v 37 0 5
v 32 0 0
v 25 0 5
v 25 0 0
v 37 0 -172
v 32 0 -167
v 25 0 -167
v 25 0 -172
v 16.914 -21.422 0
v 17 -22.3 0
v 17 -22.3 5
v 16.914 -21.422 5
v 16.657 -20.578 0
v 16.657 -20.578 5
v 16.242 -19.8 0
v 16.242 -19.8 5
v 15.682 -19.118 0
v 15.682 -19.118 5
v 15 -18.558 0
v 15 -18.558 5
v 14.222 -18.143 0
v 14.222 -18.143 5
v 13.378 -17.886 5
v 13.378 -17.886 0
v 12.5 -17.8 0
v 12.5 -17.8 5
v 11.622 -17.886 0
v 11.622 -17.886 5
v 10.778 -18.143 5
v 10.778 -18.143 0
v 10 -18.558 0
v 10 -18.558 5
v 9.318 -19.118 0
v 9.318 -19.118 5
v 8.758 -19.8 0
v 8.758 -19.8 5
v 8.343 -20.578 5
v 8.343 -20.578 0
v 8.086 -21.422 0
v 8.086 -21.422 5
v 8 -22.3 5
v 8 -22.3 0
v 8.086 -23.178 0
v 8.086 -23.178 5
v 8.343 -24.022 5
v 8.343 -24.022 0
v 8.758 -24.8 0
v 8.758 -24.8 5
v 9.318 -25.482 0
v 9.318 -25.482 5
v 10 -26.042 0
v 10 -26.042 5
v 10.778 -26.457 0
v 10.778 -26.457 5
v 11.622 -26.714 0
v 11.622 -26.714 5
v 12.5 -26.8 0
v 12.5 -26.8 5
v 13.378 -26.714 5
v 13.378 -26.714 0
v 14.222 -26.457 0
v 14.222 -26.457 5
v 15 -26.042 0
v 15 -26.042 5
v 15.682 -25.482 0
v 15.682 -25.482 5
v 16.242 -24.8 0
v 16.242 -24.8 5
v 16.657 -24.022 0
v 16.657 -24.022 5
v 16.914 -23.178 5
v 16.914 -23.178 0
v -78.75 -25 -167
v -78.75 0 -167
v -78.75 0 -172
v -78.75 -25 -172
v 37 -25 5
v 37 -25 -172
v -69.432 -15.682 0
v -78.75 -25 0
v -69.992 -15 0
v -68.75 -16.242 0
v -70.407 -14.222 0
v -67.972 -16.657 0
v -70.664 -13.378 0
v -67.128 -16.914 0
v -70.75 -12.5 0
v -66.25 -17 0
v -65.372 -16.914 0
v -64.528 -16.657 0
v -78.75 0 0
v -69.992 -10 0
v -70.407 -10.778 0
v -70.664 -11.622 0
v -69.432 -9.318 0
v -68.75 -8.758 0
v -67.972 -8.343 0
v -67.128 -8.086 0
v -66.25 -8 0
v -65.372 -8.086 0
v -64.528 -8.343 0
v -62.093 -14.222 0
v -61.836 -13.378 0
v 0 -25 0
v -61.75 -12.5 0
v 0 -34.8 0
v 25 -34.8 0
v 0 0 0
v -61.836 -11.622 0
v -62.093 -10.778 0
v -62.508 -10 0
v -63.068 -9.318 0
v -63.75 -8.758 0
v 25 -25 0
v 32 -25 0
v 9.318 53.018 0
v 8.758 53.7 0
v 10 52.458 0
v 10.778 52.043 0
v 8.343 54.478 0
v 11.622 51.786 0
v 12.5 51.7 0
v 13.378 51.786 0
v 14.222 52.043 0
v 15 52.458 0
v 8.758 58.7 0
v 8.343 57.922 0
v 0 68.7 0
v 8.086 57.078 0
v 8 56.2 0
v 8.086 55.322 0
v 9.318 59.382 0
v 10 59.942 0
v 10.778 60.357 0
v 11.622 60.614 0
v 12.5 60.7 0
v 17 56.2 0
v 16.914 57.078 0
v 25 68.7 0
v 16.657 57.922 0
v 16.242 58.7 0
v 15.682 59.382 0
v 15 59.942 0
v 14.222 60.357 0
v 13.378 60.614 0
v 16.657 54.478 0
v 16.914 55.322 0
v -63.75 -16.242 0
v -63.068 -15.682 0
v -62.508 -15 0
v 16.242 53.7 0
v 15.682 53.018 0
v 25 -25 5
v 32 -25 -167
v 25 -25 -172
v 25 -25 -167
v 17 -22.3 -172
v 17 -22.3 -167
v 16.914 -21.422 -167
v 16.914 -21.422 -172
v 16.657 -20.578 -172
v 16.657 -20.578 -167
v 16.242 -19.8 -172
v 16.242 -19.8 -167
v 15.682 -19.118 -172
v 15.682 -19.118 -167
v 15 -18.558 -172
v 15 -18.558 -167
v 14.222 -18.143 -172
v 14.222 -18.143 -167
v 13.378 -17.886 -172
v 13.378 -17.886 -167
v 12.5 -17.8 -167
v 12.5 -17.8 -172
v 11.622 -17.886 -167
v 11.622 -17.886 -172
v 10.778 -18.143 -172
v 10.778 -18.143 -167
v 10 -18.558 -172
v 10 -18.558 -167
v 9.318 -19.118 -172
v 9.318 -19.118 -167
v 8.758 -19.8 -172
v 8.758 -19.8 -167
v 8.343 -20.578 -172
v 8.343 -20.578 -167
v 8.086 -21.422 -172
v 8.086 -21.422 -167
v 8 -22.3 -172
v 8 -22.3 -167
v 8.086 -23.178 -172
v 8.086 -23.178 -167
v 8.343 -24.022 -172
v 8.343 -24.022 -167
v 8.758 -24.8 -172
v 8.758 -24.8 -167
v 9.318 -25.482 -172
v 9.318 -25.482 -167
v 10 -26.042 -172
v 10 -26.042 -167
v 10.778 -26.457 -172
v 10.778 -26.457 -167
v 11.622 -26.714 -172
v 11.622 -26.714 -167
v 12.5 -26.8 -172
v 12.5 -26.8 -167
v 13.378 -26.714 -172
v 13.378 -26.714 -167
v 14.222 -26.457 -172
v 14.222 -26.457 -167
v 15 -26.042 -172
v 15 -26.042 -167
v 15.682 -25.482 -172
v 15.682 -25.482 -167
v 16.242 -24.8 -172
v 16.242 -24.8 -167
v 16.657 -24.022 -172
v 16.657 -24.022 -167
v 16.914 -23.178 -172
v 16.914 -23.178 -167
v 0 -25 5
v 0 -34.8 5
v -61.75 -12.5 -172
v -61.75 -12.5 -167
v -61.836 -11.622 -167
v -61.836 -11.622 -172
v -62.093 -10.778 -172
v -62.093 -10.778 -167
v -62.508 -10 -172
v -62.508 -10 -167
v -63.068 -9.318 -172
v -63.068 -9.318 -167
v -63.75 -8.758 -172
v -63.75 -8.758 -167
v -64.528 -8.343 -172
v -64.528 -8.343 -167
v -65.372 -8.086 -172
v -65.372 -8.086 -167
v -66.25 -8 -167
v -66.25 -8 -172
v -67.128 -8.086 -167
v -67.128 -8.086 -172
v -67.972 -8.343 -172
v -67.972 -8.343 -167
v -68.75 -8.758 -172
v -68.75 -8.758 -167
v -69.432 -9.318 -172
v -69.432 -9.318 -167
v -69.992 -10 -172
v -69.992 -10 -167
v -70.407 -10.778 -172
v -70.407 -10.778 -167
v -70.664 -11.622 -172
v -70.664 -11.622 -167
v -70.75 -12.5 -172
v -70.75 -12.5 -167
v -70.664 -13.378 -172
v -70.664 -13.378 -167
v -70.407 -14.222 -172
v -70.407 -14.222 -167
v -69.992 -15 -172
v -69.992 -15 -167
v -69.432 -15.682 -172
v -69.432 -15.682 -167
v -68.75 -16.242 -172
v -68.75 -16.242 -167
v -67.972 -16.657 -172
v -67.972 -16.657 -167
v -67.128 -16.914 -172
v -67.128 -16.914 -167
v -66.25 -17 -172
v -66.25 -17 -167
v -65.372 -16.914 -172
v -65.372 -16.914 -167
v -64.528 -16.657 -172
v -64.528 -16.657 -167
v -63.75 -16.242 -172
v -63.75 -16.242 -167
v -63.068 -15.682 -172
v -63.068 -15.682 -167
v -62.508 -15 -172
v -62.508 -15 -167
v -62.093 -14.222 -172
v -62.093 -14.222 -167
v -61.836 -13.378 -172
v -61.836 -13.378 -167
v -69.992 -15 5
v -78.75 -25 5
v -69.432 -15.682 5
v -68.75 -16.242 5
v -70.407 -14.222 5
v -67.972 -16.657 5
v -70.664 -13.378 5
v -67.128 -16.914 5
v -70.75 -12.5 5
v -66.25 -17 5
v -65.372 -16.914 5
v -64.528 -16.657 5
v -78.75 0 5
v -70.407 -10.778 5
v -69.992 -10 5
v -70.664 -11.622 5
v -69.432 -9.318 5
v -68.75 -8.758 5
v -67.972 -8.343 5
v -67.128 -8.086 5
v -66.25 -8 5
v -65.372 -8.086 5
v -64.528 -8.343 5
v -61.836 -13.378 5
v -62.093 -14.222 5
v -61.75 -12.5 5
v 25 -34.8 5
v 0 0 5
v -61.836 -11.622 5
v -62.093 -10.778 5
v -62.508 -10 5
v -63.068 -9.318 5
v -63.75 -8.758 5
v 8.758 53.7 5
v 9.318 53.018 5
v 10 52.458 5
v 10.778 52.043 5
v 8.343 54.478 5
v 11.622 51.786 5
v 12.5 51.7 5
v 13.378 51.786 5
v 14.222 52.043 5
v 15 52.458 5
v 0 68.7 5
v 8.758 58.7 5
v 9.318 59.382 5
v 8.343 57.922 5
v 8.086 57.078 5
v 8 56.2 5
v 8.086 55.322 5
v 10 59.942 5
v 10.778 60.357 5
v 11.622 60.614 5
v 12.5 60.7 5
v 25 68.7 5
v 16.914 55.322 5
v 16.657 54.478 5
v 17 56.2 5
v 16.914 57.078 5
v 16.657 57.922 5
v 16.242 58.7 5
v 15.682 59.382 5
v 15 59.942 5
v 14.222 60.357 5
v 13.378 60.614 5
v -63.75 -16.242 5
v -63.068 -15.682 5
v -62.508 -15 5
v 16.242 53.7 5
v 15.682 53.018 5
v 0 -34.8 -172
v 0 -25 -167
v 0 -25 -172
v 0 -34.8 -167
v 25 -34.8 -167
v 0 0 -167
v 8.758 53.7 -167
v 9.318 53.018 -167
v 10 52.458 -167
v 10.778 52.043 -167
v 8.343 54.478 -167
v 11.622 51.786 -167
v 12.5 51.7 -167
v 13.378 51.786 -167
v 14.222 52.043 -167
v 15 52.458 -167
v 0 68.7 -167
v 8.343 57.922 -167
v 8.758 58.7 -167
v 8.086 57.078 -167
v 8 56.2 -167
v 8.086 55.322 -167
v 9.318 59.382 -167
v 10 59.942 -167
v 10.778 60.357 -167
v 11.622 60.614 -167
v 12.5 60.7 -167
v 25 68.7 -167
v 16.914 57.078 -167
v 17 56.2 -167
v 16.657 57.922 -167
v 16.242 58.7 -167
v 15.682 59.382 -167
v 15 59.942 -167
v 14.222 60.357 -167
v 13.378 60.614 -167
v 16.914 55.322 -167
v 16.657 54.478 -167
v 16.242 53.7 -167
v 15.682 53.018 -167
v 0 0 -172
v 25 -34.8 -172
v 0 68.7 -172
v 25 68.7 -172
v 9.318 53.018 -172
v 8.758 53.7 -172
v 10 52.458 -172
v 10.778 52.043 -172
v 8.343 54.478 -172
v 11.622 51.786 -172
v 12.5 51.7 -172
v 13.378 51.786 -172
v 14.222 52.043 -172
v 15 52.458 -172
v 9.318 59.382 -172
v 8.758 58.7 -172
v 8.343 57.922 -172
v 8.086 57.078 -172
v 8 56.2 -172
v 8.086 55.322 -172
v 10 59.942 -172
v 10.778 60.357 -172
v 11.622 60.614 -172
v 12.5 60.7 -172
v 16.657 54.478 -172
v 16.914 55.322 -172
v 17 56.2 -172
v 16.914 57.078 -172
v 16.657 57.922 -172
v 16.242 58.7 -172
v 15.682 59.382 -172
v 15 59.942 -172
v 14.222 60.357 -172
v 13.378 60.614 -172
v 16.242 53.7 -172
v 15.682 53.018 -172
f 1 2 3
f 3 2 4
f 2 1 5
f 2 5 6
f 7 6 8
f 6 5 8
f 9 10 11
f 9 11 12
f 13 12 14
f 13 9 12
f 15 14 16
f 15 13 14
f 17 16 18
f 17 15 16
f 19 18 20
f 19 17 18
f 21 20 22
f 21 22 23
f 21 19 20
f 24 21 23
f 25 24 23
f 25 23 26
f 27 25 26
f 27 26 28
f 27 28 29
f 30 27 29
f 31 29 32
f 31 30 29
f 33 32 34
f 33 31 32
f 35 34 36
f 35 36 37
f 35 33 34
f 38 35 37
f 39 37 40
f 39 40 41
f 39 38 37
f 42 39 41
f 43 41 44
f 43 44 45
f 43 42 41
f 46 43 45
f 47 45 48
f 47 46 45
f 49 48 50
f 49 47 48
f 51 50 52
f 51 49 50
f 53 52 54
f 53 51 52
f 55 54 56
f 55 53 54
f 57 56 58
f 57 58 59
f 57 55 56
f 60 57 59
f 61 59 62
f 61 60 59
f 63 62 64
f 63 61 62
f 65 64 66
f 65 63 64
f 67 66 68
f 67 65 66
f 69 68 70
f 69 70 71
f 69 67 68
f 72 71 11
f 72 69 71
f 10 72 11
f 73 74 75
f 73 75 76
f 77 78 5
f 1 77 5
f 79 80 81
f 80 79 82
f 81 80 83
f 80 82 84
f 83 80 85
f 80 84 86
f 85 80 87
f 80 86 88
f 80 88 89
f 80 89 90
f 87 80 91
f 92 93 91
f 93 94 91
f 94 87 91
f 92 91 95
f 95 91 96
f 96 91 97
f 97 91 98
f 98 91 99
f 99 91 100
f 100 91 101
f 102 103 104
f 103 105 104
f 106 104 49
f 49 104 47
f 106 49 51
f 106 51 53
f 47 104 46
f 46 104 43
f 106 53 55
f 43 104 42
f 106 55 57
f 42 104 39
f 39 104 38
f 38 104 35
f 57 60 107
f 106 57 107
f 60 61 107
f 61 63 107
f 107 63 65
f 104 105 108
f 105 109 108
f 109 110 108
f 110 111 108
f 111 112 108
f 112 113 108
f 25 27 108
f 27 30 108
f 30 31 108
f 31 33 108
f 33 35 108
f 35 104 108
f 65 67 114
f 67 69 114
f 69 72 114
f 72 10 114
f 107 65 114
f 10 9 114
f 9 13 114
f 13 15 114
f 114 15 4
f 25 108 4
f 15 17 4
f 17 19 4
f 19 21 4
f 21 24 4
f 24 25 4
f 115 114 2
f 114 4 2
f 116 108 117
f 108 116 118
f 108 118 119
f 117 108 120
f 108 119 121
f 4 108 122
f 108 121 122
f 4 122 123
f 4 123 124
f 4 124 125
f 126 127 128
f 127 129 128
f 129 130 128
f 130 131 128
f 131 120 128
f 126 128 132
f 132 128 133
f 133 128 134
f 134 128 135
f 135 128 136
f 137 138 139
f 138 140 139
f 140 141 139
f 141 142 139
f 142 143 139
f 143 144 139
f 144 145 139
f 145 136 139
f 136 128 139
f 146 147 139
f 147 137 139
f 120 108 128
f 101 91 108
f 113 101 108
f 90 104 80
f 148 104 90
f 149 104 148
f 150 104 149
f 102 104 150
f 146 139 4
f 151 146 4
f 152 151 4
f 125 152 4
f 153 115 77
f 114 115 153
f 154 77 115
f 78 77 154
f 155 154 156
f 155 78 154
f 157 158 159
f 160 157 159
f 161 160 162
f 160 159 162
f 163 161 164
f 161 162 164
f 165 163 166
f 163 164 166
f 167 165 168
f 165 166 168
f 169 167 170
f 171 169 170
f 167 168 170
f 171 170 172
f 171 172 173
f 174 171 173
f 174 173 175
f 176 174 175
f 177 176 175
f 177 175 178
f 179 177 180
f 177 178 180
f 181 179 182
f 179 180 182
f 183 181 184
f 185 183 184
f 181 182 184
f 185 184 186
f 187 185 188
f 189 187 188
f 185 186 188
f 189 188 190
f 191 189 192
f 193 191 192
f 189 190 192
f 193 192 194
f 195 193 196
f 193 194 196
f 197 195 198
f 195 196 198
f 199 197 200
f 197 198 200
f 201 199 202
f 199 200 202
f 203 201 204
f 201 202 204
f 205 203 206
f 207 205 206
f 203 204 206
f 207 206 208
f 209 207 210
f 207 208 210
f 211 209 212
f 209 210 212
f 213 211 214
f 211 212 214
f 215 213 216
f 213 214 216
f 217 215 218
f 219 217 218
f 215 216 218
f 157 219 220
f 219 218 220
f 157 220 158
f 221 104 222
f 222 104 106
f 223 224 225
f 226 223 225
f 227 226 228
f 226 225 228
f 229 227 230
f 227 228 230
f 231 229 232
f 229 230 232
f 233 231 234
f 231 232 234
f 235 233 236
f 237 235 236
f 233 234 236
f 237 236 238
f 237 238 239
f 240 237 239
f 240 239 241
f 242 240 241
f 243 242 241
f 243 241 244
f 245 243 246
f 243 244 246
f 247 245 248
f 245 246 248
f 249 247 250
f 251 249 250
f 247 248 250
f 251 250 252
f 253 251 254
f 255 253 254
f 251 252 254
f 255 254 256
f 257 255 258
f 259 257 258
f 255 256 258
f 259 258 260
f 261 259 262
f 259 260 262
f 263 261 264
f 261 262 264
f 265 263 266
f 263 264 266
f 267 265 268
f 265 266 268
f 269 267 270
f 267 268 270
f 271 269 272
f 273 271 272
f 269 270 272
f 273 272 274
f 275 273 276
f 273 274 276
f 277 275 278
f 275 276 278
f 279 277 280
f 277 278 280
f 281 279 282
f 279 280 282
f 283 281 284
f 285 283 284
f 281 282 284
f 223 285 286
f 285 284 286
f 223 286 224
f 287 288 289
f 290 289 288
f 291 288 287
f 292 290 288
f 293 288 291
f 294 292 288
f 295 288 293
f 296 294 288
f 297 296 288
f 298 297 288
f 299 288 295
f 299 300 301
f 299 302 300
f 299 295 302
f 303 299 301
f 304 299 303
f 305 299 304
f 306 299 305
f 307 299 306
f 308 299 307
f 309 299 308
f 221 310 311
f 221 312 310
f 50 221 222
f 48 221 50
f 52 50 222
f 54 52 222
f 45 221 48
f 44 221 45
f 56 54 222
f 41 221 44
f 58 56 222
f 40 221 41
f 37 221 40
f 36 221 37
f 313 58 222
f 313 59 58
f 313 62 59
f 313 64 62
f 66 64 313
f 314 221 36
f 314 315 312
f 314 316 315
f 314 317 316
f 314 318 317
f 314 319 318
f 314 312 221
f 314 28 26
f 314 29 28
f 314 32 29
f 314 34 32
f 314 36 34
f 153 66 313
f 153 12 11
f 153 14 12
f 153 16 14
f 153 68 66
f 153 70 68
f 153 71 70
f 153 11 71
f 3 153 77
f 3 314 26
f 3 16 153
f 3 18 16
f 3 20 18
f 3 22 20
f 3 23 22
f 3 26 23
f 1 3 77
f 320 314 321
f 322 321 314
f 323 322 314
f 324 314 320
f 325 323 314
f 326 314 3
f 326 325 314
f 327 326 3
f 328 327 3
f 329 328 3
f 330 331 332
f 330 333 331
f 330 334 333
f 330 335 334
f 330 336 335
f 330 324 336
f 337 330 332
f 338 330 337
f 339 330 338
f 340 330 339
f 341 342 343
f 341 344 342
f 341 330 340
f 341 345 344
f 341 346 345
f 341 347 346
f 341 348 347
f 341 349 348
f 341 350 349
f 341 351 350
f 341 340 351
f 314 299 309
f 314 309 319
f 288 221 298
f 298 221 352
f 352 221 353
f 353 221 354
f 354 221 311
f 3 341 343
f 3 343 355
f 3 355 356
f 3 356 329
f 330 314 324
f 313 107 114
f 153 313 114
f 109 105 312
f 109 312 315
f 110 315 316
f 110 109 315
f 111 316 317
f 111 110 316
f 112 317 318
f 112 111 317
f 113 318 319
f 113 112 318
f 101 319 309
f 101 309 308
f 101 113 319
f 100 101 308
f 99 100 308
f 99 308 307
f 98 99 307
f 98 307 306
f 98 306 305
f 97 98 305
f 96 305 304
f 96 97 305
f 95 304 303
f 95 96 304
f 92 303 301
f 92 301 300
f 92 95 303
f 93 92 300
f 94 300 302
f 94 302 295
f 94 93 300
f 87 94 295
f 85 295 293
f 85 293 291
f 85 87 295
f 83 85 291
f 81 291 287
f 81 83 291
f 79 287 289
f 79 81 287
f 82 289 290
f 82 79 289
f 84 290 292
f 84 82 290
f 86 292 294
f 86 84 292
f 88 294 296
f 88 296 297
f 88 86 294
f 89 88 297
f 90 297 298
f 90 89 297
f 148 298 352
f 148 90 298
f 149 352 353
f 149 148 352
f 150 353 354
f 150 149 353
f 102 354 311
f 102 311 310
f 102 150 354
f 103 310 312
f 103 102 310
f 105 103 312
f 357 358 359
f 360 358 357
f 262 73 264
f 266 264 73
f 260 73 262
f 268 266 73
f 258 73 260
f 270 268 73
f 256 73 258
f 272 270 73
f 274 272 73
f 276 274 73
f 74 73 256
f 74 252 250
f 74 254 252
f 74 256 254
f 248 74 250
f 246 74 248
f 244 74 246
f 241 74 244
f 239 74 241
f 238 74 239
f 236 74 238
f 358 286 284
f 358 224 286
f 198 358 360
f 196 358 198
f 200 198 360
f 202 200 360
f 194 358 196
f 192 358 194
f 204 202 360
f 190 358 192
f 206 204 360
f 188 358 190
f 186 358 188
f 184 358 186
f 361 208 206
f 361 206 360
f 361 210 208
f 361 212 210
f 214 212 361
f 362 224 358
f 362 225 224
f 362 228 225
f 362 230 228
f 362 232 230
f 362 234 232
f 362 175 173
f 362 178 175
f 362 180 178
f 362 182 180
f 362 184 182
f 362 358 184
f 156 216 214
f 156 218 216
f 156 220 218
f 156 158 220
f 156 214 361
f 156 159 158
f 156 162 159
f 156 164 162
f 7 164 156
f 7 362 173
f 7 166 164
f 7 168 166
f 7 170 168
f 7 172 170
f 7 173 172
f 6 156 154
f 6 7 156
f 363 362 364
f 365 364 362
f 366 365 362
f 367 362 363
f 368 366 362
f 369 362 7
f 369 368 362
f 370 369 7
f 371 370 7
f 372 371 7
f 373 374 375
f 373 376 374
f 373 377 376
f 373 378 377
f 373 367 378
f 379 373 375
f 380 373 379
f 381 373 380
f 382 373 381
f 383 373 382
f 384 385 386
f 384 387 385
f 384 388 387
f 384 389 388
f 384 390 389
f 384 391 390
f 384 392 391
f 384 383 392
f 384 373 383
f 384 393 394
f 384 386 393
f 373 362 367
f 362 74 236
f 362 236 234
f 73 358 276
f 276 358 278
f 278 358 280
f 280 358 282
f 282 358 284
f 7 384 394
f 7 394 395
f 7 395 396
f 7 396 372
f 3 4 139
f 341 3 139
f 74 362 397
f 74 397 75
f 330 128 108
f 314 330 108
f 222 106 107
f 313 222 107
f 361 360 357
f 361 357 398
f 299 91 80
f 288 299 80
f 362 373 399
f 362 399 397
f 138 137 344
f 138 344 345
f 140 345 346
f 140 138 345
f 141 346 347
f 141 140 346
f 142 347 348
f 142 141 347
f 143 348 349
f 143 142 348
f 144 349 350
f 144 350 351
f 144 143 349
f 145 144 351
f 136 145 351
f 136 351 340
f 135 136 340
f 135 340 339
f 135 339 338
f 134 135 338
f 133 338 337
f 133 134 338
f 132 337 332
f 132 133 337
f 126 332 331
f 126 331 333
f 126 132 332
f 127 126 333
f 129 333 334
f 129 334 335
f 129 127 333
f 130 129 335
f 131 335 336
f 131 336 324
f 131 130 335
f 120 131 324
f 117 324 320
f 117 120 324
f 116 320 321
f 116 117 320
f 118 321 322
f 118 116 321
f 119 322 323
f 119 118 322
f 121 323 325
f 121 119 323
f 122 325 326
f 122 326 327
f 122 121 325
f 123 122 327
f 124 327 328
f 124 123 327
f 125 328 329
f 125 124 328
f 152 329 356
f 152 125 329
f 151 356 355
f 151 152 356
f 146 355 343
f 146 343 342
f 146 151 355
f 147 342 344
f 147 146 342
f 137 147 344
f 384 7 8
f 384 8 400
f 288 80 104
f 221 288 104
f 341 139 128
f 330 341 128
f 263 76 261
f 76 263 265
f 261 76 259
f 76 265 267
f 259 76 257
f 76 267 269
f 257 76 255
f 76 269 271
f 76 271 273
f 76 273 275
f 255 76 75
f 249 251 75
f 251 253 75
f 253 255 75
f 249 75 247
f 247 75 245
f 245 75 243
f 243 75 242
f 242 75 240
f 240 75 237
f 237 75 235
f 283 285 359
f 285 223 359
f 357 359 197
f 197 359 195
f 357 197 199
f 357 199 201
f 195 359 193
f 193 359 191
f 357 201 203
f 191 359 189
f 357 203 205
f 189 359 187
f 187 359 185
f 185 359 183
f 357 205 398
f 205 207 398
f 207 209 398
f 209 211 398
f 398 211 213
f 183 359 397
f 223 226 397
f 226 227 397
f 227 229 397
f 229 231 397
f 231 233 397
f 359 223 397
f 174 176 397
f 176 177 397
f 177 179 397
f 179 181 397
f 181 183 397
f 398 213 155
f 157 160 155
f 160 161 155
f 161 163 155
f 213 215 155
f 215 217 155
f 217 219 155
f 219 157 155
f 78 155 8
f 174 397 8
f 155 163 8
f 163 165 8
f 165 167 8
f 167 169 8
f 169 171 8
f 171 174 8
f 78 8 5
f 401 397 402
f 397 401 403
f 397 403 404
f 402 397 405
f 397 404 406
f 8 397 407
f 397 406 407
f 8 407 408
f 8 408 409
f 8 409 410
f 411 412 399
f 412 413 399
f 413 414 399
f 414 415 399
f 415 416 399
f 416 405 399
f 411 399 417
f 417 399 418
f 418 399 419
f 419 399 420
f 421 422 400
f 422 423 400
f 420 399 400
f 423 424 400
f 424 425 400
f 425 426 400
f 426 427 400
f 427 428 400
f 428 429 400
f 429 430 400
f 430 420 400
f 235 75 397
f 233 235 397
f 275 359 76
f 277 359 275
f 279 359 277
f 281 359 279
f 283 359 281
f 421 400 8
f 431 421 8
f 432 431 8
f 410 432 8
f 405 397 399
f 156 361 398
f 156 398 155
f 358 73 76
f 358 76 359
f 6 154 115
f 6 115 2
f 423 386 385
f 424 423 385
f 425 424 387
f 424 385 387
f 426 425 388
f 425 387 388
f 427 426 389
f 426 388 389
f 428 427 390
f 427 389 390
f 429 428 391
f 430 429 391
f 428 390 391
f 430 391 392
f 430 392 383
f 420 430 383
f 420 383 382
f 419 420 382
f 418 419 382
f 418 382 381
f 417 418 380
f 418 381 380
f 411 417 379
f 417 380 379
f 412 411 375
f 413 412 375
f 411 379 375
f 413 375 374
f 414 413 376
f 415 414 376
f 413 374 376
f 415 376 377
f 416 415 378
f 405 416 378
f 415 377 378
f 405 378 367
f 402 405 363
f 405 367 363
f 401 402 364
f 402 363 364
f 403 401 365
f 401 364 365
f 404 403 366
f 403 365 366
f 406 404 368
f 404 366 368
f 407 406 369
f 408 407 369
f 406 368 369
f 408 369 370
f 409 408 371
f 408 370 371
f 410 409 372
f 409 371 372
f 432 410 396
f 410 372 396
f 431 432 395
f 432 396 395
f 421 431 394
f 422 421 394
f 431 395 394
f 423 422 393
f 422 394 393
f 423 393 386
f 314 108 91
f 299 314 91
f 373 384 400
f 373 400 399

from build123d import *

# Parameters (mm, degrees)
SKETCH1_R           = 4.5
BOSS_EXTRUDE1_DEPTH = 5
SKETCH2_W           = 5
SKETCH2_H           = 25
BOSS_EXTRUDE2_DEPTH = 83.5


with BuildPart() as part:
    # Sketch1 → Boss-Extrude1 (new body)
    with BuildSketch(Plane.XY):
        Polygon((0, 0), (-78.75, 0), (-78.75, -25), (0, -25), (0, -34.8), (25, -34.8), (25, -25), (37, -25), (37, 0), (25, 0), (25, 68.7), (0, 68.7), align=None)
        with Locations((-66.25, -12.5)):
            Circle(SKETCH1_R, mode=Mode.SUBTRACT)
        with Locations((12.5, -22.3)):
            Circle(SKETCH1_R, mode=Mode.SUBTRACT)
        with Locations((12.5, 56.2)):
            Circle(SKETCH1_R, mode=Mode.SUBTRACT)
    extrude(amount=BOSS_EXTRUDE1_DEPTH)

    # Sketch2 → Boss-Extrude2 (add)
    with BuildSketch(Plane(origin=(0, 0, 0), x_dir=(-1, 0, 0), z_dir=(0, 0, -1))):
        with Locations((-34.5, -12.5)):
            Rectangle(SKETCH2_W, SKETCH2_H)
    extrude(amount=BOSS_EXTRUDE2_DEPTH)

    # Mirror5: part across plane


with BuildPart() as part_1:
    add(part.part)
    add(part.part.mirror(Plane(origin=(0, 0, -83.5), x_dir=(1, 0, 0), z_dir=(0, 0, -1))))


solid = part_1.part
